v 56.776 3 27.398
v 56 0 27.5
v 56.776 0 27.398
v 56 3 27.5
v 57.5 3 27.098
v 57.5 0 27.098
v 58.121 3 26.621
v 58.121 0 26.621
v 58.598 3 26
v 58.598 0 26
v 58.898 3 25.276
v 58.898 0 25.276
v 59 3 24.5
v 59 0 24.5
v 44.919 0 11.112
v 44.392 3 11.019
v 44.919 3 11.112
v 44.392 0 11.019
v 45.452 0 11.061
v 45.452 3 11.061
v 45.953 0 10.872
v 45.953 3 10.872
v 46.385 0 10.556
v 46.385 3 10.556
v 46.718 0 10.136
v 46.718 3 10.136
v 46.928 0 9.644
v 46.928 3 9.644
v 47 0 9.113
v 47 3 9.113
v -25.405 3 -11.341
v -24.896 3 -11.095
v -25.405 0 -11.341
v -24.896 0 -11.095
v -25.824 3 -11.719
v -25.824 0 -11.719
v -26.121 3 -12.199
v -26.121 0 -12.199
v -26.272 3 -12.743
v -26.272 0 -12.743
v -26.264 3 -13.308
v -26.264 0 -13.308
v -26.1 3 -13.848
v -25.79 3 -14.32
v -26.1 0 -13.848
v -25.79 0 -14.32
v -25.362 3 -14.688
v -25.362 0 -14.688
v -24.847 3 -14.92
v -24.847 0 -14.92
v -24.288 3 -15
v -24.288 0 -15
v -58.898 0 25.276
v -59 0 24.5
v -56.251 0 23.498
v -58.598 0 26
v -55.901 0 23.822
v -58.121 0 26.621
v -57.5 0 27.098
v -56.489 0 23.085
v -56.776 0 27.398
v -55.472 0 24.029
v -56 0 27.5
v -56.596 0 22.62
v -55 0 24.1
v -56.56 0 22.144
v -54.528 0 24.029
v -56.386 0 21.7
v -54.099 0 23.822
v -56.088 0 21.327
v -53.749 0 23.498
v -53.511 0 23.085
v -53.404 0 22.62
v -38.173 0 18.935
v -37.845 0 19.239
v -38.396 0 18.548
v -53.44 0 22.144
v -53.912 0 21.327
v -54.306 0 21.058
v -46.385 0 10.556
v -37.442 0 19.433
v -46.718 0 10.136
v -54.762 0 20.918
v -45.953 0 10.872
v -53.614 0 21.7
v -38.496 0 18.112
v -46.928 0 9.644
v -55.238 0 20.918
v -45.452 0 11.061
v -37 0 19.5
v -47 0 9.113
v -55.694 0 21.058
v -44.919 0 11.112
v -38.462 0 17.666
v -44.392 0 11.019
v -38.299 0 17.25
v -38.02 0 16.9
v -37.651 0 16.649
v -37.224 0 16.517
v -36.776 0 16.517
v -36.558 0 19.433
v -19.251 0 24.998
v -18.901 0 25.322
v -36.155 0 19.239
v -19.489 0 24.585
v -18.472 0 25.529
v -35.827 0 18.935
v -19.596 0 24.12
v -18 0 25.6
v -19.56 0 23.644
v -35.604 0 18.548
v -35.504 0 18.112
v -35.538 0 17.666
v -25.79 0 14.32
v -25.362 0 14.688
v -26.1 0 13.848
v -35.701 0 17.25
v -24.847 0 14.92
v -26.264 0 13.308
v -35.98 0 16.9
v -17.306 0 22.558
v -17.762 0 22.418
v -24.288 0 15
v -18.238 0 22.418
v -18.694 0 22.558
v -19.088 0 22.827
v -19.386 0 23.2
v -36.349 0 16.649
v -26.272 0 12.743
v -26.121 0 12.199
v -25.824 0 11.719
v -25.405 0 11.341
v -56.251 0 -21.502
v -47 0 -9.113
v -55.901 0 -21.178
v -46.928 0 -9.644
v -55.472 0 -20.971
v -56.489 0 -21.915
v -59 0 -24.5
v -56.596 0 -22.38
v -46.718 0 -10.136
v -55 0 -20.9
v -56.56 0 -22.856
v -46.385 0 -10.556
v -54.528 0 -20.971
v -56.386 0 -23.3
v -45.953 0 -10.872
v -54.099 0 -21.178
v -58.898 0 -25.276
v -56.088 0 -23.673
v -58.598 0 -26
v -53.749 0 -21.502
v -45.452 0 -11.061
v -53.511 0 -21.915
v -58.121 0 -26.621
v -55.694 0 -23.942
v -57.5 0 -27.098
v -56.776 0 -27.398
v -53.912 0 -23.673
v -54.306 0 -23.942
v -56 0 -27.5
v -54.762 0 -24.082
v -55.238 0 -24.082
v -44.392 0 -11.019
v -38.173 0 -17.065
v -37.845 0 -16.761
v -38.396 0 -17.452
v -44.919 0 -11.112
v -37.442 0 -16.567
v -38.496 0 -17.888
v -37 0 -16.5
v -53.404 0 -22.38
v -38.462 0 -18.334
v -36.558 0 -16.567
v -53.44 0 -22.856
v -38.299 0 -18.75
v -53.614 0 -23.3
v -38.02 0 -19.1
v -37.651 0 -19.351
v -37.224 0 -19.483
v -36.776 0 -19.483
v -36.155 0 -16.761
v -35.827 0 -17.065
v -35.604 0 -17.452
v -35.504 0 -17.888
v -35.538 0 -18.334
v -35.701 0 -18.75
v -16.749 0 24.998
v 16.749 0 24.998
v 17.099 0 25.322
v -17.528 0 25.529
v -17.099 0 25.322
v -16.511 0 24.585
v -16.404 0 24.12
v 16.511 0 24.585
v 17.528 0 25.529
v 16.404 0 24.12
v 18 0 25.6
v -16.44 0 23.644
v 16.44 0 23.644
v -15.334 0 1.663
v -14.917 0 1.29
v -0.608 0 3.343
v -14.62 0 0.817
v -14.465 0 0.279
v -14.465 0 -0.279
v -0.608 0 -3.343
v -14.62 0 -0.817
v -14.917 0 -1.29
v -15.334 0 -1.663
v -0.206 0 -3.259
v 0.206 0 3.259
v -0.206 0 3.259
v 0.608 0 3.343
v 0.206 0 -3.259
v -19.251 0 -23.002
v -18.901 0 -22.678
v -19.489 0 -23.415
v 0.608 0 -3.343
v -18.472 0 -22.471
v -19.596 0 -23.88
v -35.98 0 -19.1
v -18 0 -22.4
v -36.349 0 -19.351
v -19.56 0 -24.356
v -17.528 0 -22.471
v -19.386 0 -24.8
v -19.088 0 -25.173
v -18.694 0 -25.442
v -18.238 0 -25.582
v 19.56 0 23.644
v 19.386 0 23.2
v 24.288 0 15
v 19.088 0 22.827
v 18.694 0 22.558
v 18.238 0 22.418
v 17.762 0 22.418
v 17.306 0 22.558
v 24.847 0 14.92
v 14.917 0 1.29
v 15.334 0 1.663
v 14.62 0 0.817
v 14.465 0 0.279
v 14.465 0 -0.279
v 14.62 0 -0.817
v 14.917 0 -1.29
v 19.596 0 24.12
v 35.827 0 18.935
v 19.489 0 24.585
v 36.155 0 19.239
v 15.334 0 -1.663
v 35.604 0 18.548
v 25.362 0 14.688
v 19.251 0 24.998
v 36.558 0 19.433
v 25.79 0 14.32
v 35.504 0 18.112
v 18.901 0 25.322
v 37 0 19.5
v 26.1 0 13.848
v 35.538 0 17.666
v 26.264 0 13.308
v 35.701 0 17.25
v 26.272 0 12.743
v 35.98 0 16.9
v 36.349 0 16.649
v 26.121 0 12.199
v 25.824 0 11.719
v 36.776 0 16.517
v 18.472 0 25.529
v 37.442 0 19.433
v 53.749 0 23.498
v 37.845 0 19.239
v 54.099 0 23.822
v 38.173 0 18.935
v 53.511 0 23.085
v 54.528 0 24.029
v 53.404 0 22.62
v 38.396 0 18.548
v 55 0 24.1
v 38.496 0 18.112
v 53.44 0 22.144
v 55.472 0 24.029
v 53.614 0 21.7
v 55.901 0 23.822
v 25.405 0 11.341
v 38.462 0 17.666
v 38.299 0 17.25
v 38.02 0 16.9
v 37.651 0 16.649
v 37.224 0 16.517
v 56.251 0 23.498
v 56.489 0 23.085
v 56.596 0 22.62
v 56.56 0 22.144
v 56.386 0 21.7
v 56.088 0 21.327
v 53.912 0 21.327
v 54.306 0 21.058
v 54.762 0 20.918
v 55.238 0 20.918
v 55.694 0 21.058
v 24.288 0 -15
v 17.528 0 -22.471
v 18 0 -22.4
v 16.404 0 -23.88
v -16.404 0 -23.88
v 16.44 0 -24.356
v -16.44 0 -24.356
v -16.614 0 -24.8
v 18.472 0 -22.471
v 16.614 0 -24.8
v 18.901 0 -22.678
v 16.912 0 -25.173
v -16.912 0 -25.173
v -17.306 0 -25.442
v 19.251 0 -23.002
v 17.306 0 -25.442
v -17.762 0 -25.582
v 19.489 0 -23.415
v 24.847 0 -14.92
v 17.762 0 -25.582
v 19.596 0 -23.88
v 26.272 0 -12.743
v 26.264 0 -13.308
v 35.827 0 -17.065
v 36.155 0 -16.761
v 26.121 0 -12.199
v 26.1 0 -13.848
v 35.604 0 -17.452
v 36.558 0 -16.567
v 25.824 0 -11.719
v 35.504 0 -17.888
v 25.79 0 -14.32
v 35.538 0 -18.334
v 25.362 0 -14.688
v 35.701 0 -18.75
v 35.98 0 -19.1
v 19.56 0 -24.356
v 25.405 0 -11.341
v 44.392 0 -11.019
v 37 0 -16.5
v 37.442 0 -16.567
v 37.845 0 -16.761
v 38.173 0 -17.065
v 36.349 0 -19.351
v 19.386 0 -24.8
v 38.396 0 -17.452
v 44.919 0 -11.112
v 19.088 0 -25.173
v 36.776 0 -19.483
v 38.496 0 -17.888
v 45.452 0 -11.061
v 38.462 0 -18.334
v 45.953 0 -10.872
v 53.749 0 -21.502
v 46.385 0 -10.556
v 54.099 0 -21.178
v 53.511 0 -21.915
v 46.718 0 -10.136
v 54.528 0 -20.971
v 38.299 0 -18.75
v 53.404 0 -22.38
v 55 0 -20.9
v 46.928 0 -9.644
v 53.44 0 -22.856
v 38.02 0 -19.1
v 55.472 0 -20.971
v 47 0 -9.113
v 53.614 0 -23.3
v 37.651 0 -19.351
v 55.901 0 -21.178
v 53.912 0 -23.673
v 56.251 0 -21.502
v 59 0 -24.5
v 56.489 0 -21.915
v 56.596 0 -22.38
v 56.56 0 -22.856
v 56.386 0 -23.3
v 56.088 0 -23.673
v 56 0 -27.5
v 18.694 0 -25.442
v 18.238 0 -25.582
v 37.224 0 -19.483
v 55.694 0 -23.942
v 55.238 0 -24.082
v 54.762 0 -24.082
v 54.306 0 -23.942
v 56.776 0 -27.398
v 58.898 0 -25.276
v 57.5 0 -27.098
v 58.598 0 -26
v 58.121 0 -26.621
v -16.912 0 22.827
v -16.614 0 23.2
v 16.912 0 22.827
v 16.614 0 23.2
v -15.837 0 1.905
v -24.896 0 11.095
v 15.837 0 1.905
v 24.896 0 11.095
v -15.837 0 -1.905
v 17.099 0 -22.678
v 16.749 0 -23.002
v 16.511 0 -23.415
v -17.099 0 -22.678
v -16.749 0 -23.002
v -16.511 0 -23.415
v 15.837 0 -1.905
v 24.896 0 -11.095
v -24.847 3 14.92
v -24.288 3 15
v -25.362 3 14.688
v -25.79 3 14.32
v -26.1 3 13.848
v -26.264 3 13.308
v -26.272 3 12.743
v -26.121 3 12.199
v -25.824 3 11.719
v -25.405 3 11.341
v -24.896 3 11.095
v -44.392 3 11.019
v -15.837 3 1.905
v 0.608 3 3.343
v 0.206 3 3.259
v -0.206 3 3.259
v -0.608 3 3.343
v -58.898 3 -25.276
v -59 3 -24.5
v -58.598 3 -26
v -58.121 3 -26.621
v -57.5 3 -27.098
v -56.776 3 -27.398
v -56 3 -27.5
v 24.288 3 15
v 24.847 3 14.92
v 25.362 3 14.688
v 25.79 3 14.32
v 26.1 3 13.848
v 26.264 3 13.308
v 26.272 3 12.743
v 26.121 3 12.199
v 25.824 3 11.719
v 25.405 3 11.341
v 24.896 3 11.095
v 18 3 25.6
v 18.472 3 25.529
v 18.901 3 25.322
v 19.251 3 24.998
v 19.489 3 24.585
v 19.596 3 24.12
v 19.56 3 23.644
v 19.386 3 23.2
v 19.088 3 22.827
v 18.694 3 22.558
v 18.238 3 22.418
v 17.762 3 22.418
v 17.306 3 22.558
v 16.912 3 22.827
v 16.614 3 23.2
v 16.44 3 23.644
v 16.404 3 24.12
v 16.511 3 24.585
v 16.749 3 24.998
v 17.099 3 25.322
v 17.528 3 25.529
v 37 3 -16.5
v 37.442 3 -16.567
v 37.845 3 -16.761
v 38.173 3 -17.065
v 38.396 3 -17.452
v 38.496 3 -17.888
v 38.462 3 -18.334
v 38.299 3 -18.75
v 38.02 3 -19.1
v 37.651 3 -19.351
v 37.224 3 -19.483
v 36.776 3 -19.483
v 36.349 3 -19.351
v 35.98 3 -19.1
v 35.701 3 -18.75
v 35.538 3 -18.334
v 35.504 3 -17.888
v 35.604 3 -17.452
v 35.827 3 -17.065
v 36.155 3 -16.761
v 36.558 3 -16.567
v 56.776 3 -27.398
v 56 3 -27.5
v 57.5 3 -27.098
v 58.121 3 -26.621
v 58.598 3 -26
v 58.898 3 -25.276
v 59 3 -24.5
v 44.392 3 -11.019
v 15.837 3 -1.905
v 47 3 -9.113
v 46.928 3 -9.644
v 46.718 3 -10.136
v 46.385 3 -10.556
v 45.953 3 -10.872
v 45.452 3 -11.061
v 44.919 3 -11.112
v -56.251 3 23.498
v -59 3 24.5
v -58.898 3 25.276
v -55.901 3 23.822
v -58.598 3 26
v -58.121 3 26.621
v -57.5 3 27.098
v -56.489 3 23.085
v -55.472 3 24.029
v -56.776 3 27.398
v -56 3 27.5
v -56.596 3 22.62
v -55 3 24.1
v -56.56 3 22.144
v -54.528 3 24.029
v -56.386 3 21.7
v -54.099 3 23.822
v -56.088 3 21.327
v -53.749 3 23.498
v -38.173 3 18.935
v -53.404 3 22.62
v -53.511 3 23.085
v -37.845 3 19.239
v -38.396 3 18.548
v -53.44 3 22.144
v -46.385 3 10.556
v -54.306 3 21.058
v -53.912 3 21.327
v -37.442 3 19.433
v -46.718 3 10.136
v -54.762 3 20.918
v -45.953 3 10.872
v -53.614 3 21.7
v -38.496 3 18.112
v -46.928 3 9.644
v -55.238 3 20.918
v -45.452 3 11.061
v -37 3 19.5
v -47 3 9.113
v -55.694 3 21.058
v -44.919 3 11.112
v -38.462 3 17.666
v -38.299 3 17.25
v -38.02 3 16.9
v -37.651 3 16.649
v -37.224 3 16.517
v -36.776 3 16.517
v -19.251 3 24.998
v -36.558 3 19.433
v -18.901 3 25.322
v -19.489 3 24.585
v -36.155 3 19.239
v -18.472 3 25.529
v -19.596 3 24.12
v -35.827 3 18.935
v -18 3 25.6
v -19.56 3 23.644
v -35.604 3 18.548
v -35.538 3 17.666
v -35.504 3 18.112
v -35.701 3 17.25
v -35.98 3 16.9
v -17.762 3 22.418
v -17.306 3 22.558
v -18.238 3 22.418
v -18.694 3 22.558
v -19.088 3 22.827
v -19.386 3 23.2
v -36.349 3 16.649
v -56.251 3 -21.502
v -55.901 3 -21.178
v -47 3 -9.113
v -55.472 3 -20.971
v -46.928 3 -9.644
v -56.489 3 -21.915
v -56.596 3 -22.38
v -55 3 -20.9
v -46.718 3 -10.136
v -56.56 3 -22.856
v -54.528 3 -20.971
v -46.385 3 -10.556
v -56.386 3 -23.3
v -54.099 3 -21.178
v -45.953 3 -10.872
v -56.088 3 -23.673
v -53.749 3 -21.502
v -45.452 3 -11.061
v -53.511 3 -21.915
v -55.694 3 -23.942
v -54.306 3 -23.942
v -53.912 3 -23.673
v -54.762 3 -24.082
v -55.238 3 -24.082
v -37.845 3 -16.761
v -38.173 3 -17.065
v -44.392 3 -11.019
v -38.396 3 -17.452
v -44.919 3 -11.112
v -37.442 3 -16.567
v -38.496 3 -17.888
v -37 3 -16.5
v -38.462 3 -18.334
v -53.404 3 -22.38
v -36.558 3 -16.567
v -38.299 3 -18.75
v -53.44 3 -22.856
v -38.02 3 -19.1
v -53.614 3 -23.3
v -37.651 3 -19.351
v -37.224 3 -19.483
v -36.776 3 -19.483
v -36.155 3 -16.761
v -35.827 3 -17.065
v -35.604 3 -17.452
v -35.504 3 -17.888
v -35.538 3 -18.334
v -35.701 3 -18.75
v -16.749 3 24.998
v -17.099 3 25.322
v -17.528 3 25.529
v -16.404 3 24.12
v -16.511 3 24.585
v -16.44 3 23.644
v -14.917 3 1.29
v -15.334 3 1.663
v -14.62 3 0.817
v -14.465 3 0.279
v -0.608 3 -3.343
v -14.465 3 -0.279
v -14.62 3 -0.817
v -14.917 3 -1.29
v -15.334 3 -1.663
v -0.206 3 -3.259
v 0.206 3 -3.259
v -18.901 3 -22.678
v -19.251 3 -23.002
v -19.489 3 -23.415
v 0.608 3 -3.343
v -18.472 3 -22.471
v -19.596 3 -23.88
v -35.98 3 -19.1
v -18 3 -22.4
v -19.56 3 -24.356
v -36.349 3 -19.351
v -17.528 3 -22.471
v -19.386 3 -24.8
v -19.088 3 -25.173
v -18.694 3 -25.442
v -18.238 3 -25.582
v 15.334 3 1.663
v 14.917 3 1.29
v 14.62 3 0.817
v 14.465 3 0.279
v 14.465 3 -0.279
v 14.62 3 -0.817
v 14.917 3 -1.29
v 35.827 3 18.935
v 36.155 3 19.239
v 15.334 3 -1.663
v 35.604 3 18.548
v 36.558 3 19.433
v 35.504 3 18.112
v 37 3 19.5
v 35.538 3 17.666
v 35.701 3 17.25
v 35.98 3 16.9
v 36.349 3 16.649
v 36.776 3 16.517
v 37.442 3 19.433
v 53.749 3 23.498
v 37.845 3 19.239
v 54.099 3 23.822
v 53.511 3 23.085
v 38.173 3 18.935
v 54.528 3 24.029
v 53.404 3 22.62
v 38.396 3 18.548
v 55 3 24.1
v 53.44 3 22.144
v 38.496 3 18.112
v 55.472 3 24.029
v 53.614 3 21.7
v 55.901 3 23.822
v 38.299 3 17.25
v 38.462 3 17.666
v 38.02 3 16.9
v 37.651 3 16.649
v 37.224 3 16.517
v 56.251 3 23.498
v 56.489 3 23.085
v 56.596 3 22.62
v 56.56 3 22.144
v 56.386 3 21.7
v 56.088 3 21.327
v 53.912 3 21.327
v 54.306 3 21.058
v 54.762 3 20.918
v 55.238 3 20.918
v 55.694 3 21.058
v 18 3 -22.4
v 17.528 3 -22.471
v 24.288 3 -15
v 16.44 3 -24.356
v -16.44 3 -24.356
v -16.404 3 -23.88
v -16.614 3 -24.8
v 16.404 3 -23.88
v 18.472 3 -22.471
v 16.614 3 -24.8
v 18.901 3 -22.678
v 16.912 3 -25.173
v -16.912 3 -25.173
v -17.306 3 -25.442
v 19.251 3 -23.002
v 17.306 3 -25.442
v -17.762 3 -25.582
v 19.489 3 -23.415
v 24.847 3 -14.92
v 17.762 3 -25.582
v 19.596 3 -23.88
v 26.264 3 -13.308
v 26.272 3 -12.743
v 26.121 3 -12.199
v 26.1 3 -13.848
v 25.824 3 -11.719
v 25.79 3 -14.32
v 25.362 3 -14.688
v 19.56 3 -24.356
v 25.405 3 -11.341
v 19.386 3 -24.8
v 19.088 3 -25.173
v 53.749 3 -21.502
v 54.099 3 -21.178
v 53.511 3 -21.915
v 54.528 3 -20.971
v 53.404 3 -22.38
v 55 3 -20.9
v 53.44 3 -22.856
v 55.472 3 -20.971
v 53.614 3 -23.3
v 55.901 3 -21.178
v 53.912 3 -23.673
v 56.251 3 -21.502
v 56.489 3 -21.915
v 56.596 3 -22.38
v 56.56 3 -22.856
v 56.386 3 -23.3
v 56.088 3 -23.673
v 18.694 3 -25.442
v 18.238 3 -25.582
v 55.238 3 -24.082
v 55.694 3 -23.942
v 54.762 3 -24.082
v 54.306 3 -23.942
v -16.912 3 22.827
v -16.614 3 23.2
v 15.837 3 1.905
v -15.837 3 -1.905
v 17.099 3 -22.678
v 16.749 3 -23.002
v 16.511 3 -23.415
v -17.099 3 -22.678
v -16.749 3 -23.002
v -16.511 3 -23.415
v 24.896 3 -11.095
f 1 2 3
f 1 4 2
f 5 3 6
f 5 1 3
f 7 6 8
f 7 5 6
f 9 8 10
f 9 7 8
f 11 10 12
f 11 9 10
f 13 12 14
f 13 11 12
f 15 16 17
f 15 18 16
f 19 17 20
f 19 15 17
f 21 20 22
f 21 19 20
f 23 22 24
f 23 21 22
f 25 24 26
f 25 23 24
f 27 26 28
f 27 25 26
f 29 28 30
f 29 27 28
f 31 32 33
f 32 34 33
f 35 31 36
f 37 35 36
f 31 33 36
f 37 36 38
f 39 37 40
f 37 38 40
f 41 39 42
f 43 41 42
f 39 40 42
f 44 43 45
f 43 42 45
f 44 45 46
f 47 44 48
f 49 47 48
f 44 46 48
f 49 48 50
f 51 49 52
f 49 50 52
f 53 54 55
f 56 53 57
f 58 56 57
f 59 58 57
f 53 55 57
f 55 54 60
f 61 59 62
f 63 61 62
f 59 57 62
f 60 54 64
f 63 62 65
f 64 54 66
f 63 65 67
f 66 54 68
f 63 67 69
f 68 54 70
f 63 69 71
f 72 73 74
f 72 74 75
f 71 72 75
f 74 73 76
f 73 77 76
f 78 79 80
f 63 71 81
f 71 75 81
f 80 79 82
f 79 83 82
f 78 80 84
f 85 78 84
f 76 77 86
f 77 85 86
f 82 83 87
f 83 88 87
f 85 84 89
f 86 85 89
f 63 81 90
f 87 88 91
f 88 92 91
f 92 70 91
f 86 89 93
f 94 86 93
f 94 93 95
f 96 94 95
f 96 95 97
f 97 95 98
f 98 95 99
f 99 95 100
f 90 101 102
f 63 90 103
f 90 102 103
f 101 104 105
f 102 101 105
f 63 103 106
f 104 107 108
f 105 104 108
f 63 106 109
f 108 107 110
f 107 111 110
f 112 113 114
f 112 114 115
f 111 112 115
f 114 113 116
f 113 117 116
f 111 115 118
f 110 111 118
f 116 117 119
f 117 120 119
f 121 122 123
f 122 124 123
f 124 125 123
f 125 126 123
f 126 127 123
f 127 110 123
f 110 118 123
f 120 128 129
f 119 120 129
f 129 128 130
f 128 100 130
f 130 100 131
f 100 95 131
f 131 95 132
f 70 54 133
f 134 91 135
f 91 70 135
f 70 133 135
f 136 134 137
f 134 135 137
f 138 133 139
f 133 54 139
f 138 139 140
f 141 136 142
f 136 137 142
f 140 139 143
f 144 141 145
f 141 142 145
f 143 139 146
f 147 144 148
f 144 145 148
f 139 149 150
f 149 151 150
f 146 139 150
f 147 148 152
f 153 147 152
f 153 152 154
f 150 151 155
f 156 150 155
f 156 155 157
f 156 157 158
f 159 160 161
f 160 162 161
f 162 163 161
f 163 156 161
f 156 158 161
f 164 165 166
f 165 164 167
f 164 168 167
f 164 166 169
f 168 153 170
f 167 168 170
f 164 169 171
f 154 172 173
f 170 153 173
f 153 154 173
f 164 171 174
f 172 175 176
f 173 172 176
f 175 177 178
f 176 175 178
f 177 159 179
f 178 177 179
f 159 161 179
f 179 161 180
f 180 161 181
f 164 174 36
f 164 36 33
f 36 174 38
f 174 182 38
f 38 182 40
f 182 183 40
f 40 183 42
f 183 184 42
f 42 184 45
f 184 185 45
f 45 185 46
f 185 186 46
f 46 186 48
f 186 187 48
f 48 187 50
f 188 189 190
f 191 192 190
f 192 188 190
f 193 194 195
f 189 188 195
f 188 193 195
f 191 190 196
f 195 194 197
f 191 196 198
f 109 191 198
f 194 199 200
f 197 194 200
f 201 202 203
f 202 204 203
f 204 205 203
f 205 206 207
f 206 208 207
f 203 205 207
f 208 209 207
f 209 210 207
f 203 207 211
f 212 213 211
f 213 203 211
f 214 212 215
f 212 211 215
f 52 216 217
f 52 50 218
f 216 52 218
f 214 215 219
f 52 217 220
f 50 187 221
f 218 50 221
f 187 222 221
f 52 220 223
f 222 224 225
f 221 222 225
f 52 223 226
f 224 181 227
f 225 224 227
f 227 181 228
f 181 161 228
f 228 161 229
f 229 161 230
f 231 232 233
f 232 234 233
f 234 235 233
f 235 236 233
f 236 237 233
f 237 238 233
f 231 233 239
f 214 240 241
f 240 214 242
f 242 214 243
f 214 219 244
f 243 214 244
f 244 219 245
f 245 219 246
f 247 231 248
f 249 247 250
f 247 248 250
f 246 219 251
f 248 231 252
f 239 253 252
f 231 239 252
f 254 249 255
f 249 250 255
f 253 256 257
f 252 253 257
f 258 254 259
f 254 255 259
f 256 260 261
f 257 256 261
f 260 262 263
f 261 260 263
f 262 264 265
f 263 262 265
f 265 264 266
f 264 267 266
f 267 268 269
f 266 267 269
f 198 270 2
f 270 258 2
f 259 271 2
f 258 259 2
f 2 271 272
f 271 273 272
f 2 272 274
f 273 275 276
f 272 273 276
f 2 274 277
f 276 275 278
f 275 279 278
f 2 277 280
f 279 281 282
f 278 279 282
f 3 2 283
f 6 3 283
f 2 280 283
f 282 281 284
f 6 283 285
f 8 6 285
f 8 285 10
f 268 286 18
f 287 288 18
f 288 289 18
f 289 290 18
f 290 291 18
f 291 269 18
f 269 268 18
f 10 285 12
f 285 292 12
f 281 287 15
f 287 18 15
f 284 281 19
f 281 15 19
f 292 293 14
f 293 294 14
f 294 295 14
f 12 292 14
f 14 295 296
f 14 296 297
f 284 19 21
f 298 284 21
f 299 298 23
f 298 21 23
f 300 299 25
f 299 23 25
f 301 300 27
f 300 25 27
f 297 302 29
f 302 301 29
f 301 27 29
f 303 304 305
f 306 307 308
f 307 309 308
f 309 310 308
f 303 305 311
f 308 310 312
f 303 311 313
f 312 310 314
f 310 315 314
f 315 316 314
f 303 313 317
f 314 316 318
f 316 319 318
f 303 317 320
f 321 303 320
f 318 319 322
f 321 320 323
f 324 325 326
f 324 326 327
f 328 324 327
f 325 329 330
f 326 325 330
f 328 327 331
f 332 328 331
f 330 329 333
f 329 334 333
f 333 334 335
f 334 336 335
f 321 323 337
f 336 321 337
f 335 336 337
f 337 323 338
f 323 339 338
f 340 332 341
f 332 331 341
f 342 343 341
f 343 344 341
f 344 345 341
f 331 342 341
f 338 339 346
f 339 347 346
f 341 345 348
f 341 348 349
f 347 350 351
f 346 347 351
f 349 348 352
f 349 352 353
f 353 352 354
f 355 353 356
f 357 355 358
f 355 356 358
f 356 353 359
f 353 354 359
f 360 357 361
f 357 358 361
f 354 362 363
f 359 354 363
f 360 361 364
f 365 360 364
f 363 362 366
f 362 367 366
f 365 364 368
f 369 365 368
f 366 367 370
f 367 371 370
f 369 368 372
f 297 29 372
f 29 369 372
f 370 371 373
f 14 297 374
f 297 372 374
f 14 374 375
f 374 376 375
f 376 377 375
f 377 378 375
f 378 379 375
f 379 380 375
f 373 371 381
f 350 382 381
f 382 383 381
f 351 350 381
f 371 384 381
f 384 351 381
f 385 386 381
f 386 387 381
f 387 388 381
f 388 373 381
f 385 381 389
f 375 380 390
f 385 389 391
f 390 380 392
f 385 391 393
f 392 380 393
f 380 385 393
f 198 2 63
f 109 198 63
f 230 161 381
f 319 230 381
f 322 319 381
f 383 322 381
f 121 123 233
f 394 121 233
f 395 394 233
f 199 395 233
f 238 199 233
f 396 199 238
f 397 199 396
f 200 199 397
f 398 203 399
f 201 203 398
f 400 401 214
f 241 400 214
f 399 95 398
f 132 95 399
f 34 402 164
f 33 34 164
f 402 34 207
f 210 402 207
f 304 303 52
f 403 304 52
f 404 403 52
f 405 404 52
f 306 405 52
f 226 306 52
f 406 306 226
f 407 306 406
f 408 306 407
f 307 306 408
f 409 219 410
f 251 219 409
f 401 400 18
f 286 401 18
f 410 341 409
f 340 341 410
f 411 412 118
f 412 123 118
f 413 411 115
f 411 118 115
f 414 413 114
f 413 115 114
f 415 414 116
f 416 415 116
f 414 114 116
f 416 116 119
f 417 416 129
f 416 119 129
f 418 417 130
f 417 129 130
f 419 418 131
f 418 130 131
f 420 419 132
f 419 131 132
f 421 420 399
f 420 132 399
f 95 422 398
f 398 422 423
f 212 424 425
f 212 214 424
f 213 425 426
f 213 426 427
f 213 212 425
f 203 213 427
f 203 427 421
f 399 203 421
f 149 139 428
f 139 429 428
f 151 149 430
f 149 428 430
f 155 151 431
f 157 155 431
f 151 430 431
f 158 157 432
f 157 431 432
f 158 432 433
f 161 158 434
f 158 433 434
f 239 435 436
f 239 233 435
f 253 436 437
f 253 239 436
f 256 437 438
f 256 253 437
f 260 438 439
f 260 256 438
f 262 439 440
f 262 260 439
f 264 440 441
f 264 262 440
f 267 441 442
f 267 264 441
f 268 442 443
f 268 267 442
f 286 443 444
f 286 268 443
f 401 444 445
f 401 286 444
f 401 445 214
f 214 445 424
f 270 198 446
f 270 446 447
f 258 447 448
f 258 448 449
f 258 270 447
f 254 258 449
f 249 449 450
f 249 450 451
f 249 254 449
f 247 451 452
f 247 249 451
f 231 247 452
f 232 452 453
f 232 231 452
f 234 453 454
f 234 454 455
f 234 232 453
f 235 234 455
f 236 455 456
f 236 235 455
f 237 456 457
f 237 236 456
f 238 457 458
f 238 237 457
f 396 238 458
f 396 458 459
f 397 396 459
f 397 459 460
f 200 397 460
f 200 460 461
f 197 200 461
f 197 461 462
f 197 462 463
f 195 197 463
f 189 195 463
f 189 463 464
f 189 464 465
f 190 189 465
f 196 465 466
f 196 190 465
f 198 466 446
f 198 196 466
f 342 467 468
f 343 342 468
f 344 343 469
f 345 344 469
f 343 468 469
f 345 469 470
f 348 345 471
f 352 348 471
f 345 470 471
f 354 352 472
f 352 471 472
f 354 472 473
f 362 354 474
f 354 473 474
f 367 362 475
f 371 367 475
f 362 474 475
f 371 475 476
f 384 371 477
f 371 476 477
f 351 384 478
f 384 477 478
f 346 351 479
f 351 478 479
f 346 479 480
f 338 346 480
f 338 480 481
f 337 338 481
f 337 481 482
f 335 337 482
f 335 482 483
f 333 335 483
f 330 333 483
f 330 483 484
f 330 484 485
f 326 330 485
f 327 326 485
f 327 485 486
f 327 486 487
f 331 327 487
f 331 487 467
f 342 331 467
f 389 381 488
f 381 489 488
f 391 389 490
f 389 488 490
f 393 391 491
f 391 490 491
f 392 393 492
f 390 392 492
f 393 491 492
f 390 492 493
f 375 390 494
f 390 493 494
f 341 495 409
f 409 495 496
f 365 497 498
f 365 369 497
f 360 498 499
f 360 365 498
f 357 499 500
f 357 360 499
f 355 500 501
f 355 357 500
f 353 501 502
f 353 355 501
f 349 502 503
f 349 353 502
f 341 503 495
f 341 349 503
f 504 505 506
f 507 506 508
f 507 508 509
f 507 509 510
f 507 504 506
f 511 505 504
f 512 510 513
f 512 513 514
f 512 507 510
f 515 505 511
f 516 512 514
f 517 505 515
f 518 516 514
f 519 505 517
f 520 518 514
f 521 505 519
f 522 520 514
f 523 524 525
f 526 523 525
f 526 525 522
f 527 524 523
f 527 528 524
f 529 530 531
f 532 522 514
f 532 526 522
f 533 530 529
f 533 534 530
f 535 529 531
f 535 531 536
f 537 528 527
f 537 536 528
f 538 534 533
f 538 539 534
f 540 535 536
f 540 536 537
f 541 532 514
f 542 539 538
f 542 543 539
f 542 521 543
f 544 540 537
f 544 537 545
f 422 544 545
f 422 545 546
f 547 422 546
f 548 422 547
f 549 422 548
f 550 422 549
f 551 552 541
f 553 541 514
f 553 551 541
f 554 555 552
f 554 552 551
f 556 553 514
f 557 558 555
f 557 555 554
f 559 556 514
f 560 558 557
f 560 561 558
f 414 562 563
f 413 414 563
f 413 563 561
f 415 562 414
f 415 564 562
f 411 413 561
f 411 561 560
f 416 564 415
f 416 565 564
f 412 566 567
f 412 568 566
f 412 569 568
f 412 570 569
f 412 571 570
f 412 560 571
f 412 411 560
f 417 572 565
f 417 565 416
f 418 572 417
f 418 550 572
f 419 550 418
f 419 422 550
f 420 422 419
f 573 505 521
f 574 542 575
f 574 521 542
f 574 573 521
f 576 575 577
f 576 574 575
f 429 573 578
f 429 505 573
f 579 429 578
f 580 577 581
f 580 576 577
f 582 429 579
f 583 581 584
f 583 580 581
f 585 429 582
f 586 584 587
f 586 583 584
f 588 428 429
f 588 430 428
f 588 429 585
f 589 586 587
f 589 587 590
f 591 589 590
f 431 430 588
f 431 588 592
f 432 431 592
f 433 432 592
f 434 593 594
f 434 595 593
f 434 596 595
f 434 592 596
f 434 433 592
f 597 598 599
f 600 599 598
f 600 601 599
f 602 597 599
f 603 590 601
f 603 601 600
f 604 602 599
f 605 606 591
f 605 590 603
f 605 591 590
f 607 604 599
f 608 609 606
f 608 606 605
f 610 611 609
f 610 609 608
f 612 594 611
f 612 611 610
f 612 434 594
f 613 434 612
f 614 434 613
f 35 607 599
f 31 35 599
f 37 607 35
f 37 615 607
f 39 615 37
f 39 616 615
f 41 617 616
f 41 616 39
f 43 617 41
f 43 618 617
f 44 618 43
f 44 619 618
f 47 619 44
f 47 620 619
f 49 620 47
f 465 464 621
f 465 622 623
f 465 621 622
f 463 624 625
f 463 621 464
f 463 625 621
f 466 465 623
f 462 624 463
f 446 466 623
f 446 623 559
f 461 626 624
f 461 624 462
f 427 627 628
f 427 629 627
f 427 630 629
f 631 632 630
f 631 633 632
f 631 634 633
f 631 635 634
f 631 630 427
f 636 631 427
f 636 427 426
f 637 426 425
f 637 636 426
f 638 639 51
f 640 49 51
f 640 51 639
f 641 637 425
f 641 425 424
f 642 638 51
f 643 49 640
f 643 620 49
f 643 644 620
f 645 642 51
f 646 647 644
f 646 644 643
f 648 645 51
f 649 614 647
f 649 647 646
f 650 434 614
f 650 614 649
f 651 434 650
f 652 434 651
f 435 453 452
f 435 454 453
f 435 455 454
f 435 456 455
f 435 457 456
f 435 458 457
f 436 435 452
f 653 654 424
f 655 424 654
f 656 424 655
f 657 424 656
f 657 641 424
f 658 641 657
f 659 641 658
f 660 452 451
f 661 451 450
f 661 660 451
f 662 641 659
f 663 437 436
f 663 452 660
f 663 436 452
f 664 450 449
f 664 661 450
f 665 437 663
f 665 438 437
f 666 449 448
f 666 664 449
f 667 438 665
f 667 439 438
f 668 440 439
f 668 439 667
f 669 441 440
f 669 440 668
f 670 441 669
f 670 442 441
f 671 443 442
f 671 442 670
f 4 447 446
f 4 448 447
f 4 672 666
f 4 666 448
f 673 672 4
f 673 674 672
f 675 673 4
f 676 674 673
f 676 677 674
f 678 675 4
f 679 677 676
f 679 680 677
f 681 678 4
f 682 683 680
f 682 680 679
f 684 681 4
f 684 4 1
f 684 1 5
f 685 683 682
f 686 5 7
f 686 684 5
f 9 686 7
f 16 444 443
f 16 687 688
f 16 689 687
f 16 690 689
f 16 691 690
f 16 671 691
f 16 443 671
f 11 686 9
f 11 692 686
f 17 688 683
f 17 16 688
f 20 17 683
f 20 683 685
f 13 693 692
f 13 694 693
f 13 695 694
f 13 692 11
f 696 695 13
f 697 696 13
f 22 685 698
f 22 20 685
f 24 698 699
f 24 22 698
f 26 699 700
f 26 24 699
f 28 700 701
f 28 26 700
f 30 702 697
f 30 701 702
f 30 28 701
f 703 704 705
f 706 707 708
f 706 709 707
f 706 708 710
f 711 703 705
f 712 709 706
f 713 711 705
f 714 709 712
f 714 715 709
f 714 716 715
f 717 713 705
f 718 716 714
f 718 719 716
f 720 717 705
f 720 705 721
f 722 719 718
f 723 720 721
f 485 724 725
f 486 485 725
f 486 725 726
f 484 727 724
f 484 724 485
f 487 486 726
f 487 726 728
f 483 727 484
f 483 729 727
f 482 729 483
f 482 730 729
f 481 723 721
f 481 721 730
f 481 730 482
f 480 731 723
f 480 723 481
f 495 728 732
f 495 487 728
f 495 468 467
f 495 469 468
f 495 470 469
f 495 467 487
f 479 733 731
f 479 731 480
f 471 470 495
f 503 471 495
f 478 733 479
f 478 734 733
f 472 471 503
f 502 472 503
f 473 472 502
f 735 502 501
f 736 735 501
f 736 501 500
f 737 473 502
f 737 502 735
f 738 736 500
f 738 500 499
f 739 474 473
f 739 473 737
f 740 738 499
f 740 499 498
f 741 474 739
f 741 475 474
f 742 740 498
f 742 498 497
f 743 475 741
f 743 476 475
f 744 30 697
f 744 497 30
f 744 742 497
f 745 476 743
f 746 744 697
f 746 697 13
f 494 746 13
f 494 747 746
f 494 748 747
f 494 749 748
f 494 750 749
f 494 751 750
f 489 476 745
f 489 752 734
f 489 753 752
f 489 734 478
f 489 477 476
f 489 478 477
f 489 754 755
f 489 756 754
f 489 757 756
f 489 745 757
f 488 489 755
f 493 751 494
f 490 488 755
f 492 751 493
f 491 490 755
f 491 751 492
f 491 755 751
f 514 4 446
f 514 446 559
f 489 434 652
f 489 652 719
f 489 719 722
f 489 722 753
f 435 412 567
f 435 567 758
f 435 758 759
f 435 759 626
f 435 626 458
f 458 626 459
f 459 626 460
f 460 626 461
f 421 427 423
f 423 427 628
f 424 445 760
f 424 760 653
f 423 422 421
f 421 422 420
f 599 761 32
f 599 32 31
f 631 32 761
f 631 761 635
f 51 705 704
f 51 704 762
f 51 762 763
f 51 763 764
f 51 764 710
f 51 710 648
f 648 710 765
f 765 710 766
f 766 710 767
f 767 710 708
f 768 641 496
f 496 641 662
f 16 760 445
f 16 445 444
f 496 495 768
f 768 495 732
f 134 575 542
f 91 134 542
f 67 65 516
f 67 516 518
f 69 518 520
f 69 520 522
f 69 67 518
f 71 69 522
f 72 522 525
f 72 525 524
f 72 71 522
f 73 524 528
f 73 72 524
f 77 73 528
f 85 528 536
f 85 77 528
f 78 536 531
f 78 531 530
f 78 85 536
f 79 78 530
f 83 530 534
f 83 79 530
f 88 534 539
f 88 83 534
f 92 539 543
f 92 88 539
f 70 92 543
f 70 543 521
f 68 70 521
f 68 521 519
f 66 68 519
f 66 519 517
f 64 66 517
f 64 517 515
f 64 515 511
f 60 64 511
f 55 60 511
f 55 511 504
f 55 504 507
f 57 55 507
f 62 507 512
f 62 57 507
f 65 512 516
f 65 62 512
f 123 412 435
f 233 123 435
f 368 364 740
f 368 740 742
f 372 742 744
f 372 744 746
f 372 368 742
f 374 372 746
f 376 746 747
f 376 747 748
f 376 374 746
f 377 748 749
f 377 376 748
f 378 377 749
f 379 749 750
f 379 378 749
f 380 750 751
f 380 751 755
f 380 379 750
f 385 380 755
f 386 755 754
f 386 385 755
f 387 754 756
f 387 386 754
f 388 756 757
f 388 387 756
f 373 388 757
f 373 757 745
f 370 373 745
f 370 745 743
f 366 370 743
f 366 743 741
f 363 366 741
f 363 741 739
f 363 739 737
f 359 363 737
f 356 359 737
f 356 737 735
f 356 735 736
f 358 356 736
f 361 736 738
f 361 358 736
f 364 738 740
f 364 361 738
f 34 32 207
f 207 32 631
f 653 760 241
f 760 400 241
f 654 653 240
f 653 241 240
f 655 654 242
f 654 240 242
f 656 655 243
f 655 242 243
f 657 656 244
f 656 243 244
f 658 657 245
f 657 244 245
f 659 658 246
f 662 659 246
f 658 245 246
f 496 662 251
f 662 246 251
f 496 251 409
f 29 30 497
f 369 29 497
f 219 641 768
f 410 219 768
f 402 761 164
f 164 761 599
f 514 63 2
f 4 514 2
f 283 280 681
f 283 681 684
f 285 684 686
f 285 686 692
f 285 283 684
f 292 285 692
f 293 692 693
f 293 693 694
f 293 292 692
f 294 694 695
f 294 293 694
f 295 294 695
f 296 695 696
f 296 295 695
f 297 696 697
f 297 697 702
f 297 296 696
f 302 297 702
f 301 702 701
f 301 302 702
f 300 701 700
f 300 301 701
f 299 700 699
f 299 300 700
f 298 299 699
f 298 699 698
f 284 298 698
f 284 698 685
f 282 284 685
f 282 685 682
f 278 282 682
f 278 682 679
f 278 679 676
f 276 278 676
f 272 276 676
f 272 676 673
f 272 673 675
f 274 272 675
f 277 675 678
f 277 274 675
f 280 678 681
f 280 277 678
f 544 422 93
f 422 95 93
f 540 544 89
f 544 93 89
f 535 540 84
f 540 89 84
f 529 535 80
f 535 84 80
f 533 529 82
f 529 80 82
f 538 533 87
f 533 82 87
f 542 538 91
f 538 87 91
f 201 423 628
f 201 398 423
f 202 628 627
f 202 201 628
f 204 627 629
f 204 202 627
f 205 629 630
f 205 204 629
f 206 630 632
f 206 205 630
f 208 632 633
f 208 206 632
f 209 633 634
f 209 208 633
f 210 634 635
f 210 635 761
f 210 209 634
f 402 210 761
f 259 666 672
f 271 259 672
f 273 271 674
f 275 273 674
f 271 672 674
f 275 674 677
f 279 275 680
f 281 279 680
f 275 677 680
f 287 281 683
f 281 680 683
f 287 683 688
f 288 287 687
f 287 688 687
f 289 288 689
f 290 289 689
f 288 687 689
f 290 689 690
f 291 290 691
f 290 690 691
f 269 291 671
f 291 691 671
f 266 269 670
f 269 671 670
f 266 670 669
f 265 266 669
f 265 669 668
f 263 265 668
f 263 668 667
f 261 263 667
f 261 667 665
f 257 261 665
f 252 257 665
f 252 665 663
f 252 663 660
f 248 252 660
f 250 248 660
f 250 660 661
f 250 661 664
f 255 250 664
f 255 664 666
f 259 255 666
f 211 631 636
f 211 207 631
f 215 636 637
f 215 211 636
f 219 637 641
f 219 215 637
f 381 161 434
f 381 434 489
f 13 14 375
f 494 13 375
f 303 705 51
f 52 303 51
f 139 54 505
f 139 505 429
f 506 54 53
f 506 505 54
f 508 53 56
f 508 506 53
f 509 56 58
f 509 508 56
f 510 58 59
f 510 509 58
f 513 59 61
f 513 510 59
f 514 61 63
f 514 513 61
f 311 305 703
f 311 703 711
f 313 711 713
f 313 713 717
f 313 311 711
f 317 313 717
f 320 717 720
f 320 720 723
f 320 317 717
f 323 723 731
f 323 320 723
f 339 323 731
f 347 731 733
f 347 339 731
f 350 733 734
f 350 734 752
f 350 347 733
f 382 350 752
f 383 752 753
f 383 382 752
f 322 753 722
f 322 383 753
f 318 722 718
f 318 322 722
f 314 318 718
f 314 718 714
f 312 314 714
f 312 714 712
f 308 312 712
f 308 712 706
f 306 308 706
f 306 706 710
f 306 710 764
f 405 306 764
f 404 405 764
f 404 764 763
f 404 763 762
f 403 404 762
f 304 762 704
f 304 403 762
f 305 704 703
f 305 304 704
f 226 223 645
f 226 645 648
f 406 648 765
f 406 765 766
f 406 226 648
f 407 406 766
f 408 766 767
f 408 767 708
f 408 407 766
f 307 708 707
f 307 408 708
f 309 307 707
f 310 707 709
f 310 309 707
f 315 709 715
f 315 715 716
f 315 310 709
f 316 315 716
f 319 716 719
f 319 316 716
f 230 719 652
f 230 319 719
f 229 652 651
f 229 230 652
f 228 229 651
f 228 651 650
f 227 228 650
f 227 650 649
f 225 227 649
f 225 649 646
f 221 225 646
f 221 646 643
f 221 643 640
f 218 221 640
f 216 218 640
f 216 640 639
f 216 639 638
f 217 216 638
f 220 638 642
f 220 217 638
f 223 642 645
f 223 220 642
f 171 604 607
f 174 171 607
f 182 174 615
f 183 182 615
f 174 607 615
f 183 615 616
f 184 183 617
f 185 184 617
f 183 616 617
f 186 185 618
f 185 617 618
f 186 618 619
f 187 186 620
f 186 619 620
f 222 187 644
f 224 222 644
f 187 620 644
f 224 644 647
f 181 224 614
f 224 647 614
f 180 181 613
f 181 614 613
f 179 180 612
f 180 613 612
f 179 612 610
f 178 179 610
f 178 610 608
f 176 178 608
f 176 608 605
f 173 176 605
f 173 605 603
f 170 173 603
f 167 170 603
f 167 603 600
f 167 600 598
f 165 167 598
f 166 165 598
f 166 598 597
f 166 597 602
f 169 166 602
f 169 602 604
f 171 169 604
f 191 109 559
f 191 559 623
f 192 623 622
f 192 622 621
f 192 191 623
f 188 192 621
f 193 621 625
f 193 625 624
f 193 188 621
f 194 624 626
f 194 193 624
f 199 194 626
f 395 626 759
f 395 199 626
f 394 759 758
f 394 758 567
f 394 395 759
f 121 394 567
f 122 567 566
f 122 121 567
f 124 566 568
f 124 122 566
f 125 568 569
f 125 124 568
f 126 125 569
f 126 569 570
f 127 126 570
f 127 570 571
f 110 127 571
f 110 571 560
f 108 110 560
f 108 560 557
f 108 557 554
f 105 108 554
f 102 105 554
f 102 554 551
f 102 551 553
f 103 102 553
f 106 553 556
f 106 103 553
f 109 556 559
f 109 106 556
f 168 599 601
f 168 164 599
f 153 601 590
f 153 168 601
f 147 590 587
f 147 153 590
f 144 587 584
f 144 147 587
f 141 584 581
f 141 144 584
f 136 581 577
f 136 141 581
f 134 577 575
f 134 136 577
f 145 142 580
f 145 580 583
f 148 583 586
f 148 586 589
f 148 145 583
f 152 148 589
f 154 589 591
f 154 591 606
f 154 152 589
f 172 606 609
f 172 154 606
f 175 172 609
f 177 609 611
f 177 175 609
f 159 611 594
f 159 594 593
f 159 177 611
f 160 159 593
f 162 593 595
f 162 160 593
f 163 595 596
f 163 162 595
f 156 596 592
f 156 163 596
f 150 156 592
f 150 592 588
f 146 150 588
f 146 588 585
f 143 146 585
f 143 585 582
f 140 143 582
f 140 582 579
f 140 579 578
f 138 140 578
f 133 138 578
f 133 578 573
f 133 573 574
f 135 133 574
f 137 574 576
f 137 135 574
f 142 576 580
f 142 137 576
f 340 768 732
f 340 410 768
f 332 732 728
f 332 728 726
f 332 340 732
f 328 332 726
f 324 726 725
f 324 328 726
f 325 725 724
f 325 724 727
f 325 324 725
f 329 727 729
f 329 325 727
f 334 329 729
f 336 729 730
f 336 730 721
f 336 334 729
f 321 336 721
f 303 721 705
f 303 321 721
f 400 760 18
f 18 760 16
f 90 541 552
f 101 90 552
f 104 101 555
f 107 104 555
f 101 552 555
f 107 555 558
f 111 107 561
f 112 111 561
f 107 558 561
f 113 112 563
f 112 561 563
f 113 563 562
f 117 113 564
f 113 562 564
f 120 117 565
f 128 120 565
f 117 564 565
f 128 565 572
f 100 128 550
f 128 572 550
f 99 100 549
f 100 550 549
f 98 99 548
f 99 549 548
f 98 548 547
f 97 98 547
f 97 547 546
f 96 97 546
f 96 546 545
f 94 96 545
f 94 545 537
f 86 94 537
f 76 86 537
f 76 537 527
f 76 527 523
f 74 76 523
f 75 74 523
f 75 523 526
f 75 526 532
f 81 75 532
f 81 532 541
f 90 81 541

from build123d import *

# Parameters (mm, degrees)
SKETCH_1_W          = 118
SKETCH_1_H          = 55
SKETCH_1_R          = 1.6
EXTRUDE_1_DEPTH     = 3
SKETCH_2_R          = 1.5
CUT_EXTRUDE_1_DEPTH = 66.163256518
CUT_EXTRUDE_2_DEPTH = 66.163256518
FILLET_1_R          = 2
FILLET_2_R          = 3


with BuildPart() as part:
    # 草图1 → 凸台-拉伸1 (new body)
    with BuildSketch(Plane(origin=(0, 0, 0), x_dir=(1, 0, 0), z_dir=(0, 1, 0))):
        Rectangle(SKETCH_1_W, SKETCH_1_H)
        with Locations(Location((-55, 22.5, 0), (0, 0, 270))):
            Circle(SKETCH_1_R, mode=Mode.SUBTRACT)
        with Locations(Location((55, 22.5, 0), (0, 0, 270))):
            Circle(SKETCH_1_R, mode=Mode.SUBTRACT)
        with Locations(Location((-55, -22.5, 0), (0, 0, 270))):
            Circle(SKETCH_1_R, mode=Mode.SUBTRACT)
        with Locations(Location((55, -22.5, 0), (0, 0, 270))):
            Circle(SKETCH_1_R, mode=Mode.SUBTRACT)
        with Locations(Location((-18, 24, 0), (0, 0, 270))):
            Circle(SKETCH_1_R, mode=Mode.SUBTRACT)
        with Locations(Location((18, 24, 0), (0, 0, 270))):
            Circle(SKETCH_1_R, mode=Mode.SUBTRACT)
        with Locations(Location((18, -24, 0), (0, 0, 270))):
            Circle(SKETCH_1_R, mode=Mode.SUBTRACT)
        with Locations(Location((-18, -24, 0), (0, 0, 270))):
            Circle(SKETCH_1_R, mode=Mode.SUBTRACT)
    extrude(amount=EXTRUDE_1_DEPTH)

    # 草图2 → 切除-拉伸1 (cut, through all)
    with BuildSketch(Plane(origin=(0, 3, 0), x_dir=(1, 0, 0), z_dir=(0, 1, 0))):
        with Locations(Location((-37, 18, 0), (0, 0, 270))):
            Circle(SKETCH_2_R)
        with Locations(Location((37, 18, 0), (0, 0, 270))):
            Circle(SKETCH_2_R)
        with Locations(Location((37, -18, 0), (0, 0, 270))):
            Circle(SKETCH_2_R)
        with Locations(Location((-37, -18, 0), (0, 0, 270))):
            Circle(SKETCH_2_R)
    extrude(amount=-CUT_EXTRUDE_1_DEPTH, mode=Mode.SUBTRACT)

    # 草图3 → 切除-拉伸2 (cut, through all)
    with BuildSketch(Plane(origin=(0, 3, 0), x_dir=(1, 0, 0), z_dir=(0, 1, 0))):
        Polygon((-47, -11.850920072), (-9.867117107, 0), (-47, 11.850920072), align=None)
        Polygon((-37.132882893, 15), (0, 3.149079928), (37.132882893, 15), align=None)
        Polygon((9.867117107, 0), (47, -11.850920072), (47, 11.850920072), align=None)
        Polygon((-37.132882893, -15), (37.132882893, -15), (0, -3.149079928), align=None)
    extrude(amount=-CUT_EXTRUDE_2_DEPTH, mode=Mode.SUBTRACT)

    # 圆角1
    fillet_1_edges = [part.edges().sort_by_distance(p)[0] for p in [
        (47, 1.5, -11.850920072),
        (47, 1.5, 11.850920072),
        (9.867117107, 1.5, 0),
        (37.132882893, 1.5, -15),
        (0, 1.5, -3.149079928),
        (-37.132882893, 1.5, -15),
        (0, 1.5, 3.149079928),
        (37.132882893, 1.5, 15),
        (-37.132882893, 1.5, 15),
        (-9.867117107, 1.5, 0),
        (-47, 1.5, 11.850920072),
        (-47, 1.5, -11.850920072),
    ]]
    fillet(fillet_1_edges, radius=FILLET_1_R)

    # 圆角2
    fillet_2_edges = [part.edges().sort_by_distance(p)[0] for p in [
        (-59, 1.5, -27.5),
        (59, 1.5, -27.5),
        (59, 1.5, 27.5),
        (-59, 1.5, 27.5),
    ]]
    fillet(fillet_2_edges, radius=FILLET_2_R)


solid = part.part
